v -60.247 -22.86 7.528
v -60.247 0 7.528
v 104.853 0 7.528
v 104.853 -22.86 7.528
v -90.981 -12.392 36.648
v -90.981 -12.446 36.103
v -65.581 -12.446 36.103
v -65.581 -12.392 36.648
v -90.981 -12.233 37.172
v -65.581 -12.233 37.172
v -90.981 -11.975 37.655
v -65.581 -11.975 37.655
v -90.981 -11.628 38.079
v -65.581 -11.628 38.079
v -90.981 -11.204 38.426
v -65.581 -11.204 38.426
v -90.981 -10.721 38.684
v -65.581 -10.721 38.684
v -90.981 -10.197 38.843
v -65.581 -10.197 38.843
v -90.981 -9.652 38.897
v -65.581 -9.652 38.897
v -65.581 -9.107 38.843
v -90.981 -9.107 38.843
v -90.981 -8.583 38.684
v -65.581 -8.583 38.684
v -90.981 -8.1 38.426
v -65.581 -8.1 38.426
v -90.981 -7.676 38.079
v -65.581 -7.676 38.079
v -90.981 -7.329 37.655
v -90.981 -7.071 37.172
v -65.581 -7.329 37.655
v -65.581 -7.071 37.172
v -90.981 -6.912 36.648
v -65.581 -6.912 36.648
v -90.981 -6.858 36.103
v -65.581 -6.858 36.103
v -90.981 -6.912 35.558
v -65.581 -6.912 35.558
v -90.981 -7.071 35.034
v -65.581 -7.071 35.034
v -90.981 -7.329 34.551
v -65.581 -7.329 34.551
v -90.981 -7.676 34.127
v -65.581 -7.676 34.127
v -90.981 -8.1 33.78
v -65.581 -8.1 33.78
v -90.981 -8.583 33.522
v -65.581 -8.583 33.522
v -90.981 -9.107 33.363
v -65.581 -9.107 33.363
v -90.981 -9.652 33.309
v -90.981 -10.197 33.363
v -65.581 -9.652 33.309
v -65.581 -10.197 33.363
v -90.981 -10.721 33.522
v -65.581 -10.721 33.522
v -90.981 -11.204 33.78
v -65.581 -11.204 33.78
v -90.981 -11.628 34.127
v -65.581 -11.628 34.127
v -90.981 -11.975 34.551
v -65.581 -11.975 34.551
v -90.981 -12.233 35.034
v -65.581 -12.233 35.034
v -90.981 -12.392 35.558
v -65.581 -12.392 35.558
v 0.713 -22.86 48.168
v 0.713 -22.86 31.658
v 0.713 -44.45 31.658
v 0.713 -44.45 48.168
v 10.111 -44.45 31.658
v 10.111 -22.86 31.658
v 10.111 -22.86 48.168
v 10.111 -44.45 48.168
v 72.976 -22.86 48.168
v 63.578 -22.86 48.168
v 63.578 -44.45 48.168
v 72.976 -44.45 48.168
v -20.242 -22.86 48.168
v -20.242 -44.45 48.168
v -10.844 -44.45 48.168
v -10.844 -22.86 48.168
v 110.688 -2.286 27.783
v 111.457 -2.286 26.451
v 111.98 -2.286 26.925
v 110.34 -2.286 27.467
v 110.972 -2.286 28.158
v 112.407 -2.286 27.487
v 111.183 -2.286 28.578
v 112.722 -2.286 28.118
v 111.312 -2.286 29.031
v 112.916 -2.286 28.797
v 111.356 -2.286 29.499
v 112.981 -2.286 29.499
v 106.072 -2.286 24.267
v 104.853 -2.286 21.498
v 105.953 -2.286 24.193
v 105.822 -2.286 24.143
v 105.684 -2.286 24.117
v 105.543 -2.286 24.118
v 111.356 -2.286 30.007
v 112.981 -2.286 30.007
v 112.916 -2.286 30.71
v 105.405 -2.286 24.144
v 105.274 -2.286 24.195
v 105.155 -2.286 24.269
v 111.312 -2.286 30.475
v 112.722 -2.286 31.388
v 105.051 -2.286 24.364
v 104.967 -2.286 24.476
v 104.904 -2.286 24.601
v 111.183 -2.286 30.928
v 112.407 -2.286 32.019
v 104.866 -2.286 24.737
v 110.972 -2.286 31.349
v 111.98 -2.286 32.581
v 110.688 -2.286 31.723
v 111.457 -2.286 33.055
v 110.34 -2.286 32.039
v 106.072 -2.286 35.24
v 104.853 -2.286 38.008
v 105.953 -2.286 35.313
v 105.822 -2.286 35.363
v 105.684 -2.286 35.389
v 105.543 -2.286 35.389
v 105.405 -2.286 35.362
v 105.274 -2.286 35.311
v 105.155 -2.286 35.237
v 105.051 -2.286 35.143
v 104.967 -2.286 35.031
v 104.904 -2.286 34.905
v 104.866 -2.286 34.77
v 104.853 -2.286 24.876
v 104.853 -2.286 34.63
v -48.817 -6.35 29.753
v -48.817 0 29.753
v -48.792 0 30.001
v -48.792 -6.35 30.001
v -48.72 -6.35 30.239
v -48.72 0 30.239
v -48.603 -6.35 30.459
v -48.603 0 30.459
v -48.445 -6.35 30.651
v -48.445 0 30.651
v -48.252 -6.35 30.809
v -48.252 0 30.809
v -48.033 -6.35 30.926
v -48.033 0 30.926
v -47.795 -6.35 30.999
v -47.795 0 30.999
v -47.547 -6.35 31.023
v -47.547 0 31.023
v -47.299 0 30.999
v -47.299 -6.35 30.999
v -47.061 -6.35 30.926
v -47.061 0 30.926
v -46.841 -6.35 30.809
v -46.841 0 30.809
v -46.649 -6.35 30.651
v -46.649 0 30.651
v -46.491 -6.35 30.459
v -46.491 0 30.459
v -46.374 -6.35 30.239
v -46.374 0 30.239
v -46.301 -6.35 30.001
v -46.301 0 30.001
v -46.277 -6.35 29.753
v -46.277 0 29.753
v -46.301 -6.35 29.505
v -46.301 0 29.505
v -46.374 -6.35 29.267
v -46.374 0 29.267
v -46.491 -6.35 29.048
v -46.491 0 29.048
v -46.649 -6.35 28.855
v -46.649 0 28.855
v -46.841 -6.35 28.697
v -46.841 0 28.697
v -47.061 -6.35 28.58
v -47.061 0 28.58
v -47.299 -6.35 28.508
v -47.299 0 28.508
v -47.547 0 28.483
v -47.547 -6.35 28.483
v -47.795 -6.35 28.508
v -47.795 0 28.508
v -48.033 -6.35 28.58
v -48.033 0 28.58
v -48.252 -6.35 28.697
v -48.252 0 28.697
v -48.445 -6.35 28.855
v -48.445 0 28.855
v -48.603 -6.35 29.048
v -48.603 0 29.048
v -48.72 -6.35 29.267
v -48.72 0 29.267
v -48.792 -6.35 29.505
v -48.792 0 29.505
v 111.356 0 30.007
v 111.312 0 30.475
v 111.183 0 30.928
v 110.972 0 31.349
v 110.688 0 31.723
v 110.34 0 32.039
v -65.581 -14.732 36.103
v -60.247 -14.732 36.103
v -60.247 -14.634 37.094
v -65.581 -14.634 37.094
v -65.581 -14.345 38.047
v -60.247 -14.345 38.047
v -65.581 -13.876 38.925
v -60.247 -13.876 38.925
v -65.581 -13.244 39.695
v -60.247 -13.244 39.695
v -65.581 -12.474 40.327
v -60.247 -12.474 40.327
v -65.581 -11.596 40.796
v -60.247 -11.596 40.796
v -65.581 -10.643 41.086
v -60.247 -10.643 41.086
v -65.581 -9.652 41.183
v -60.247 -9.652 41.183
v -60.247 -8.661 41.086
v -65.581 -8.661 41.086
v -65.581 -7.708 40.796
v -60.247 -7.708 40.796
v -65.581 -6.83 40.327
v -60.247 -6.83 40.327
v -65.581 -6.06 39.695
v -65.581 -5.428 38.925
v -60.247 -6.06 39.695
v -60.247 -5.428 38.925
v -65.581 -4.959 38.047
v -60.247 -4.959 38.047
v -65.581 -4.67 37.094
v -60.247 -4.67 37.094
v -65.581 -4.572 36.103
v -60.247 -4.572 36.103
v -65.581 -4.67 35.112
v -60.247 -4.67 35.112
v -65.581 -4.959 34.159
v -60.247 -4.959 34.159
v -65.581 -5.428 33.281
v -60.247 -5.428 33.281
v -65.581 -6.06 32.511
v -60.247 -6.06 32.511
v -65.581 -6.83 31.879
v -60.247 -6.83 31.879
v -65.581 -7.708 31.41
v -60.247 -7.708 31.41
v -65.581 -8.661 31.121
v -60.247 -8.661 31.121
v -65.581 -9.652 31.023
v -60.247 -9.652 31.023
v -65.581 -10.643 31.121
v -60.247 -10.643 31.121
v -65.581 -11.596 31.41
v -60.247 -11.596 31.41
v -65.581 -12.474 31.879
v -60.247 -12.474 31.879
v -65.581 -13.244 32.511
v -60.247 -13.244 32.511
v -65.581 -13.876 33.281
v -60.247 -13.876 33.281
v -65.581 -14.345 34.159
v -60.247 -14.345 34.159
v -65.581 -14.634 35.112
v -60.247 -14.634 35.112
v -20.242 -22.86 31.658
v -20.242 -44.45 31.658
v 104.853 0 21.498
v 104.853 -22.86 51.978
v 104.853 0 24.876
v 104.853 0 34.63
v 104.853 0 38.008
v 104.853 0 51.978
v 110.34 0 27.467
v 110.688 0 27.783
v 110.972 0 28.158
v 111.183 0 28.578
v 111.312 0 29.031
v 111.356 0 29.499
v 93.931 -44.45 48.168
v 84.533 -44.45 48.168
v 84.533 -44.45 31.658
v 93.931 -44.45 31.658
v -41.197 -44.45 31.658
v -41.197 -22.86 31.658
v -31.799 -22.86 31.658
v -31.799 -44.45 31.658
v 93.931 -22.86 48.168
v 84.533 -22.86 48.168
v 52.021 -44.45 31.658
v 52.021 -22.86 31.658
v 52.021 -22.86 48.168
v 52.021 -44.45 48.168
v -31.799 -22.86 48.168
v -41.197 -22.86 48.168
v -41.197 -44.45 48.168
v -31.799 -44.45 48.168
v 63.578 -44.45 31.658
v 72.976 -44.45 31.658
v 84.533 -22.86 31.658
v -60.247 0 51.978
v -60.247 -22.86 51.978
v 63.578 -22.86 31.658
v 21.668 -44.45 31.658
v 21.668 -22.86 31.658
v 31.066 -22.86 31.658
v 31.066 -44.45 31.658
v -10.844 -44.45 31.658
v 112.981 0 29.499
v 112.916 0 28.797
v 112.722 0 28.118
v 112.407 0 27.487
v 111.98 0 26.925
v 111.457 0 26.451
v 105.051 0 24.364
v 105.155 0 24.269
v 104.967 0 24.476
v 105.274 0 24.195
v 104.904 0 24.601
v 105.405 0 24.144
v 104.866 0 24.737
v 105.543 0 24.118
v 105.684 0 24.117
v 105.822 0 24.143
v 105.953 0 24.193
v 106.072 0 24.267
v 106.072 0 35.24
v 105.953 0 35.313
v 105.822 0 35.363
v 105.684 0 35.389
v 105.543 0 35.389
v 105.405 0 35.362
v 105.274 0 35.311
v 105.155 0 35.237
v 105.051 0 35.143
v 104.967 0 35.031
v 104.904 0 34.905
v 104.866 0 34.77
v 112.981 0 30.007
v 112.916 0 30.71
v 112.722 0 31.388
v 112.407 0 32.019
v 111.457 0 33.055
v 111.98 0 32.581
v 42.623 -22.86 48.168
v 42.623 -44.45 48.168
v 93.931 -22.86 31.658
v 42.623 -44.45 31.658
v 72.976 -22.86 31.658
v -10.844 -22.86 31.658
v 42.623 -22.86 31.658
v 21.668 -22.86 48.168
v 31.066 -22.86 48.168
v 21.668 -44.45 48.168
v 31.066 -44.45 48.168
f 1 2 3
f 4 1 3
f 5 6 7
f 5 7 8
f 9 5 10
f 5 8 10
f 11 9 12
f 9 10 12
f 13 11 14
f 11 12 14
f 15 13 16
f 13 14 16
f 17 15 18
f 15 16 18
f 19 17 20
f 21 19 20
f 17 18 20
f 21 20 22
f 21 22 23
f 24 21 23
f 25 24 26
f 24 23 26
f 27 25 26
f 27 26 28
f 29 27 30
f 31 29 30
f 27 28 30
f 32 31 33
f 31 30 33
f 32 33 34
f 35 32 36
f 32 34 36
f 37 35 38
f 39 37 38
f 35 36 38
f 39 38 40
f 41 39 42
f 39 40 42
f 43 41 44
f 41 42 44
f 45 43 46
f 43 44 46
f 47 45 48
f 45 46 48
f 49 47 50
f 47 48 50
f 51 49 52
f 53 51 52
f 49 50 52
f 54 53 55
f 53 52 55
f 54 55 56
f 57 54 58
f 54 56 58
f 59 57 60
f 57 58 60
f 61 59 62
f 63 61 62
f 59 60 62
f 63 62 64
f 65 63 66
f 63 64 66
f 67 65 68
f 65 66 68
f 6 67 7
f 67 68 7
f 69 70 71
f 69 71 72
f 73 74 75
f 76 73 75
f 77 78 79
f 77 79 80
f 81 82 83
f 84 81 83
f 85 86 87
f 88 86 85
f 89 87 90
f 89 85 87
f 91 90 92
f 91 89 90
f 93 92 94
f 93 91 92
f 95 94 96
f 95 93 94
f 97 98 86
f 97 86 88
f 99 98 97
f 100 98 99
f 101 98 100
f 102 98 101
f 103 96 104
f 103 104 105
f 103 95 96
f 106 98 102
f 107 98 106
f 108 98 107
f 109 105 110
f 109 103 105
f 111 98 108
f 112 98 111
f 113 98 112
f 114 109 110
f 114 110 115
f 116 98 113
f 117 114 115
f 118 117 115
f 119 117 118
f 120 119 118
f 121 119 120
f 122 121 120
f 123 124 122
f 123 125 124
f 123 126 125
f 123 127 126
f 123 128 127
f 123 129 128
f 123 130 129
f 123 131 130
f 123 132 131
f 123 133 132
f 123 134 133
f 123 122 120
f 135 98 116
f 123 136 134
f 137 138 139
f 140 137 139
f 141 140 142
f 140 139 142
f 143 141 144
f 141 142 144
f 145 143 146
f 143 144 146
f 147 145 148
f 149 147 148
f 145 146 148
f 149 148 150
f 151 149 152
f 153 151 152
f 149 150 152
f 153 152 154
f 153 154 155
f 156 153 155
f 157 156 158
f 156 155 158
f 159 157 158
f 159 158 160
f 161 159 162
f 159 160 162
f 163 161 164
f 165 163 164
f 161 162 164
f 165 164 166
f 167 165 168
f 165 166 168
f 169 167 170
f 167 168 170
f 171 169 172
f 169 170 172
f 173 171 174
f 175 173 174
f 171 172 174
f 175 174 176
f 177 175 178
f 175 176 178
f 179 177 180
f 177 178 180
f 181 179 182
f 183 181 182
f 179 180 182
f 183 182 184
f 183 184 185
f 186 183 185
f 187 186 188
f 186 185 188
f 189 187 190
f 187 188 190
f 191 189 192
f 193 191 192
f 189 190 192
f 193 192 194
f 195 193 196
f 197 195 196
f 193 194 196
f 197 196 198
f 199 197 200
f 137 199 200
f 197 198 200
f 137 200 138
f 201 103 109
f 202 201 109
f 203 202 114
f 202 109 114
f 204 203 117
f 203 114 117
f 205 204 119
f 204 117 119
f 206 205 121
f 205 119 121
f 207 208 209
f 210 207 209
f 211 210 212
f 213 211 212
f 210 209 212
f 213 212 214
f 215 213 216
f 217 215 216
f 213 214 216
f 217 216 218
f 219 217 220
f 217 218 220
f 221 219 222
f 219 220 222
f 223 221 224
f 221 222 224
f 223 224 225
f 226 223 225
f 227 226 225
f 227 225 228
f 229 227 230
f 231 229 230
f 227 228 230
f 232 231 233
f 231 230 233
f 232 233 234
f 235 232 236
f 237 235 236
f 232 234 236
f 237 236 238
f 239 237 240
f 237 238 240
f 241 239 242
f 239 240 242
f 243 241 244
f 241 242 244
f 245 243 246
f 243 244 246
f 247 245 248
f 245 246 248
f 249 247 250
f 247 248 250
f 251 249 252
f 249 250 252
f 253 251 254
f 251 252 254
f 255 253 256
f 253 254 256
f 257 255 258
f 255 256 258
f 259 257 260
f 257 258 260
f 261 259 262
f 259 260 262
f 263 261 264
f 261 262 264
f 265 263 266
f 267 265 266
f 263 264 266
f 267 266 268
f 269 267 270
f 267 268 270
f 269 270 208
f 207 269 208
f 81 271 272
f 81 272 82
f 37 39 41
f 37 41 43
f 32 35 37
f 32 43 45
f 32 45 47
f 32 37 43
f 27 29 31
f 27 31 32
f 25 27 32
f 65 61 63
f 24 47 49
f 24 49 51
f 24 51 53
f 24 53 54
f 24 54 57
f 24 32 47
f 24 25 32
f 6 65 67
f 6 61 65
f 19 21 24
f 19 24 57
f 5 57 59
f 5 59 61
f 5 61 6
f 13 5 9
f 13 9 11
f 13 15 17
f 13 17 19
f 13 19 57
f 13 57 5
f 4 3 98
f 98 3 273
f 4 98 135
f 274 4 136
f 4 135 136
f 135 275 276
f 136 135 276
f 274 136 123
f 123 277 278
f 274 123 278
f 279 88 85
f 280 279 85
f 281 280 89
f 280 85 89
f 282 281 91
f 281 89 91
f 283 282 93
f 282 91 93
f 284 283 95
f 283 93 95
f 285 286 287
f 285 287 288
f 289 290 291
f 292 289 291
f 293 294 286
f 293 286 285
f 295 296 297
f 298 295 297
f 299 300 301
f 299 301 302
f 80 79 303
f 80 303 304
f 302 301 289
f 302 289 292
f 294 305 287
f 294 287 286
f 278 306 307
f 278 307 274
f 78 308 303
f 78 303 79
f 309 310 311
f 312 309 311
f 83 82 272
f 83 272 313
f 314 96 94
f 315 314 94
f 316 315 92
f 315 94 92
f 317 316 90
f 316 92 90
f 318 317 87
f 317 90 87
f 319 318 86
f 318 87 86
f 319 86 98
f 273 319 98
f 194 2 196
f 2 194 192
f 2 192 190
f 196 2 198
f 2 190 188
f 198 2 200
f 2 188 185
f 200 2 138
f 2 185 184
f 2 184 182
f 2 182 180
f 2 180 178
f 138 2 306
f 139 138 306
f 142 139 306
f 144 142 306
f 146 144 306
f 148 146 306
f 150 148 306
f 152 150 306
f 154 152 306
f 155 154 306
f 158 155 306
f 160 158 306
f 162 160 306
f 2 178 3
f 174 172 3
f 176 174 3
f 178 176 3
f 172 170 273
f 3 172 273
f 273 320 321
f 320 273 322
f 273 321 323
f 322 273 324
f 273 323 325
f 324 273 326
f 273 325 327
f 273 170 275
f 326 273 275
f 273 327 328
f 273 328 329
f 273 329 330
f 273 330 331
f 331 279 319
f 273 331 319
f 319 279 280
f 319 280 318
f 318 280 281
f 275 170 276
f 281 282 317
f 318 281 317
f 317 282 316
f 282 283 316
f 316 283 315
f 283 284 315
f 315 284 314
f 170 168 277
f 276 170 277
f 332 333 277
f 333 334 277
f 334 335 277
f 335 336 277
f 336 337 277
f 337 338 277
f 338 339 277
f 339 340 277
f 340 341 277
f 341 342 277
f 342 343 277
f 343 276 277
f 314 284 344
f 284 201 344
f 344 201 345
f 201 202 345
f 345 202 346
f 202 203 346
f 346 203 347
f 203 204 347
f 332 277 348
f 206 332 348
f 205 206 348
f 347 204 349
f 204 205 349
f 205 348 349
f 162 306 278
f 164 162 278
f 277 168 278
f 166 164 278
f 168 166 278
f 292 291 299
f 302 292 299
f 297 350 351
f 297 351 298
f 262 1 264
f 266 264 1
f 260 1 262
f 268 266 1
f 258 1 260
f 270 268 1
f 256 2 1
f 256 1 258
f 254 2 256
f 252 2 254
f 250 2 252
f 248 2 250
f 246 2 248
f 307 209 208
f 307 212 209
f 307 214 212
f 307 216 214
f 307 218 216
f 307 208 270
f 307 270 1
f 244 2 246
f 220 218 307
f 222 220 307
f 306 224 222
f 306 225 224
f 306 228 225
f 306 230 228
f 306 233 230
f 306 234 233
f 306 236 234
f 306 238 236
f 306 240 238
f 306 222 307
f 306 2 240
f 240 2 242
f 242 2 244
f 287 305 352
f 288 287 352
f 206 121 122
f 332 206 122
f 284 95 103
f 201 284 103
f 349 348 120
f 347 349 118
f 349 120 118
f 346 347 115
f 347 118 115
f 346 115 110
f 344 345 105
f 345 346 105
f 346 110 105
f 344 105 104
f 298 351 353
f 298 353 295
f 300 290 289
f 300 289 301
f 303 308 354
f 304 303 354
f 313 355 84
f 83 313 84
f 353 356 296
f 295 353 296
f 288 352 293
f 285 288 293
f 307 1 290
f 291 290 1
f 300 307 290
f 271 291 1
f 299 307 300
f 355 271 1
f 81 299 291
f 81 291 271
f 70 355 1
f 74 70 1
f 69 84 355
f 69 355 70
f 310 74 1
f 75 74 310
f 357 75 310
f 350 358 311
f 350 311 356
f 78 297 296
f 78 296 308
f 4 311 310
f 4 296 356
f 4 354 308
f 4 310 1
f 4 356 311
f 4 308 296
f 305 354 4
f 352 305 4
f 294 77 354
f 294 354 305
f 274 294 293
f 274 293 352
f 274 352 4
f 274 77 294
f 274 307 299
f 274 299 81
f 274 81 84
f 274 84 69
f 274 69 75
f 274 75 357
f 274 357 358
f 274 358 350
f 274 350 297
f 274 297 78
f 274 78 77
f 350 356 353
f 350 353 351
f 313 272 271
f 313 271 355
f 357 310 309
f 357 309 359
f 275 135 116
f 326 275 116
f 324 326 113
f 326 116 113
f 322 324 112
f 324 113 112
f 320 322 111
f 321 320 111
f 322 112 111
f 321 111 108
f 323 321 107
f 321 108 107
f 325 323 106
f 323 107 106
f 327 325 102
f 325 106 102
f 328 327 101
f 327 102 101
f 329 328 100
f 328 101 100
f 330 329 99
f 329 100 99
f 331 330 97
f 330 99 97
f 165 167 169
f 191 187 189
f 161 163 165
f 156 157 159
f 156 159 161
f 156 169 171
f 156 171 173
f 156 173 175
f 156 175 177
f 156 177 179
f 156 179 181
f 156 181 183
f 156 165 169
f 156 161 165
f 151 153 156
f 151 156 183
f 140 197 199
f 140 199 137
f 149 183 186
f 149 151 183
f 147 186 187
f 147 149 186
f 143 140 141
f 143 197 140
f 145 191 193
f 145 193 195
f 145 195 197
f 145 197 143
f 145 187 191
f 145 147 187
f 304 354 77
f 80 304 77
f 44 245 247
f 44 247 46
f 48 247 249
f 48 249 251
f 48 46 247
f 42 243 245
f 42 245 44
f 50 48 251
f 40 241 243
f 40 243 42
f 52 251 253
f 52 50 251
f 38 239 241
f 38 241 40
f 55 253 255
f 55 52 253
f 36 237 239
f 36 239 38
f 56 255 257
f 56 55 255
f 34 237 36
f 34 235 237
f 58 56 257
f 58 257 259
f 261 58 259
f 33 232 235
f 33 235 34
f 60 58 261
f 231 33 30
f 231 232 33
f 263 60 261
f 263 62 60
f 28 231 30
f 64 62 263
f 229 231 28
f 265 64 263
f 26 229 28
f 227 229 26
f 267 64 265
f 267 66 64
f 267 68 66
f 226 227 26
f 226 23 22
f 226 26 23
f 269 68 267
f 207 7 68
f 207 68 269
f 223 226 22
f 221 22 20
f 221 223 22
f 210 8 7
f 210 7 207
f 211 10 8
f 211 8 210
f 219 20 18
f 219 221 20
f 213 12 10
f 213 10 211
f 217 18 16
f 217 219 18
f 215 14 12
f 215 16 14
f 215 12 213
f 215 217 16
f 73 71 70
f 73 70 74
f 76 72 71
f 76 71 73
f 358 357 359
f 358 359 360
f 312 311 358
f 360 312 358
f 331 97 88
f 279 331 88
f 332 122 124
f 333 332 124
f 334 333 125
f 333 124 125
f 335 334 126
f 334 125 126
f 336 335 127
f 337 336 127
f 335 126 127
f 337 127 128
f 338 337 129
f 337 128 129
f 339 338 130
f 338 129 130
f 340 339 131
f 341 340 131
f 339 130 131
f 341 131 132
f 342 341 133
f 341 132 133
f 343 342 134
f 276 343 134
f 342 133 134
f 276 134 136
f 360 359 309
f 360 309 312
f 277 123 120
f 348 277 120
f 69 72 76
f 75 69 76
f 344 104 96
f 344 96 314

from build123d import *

# Parameters (mm, degrees)
F0_W      = 165.1
F0_H      = 44.45
F1_DEPTH  = 22.86
F2_R      = 5.08
F3_DEPTH  = 5.334
F4_R      = 2.794
F5_DEPTH  = 25.4
F6_W      = 9.398
F6_H      = 16.51
F7_DEPTH  = 21.59
F8_W      = 2.286
F8_H      = 16.51
F9_DEPTH  = 8.128
F11_DEPTH = 25.4
F12_R     = 1.27
F13_DEPTH = 6.35


with BuildPart() as f1:
    # F0 (on Front) → F1 (new body)
    with BuildSketch(Plane.XZ):
        with Locations((22.303157, 29.753123)):
            Rectangle(F0_W, F0_H)
    extrude(amount=F1_DEPTH)

    # F2 (on face) → F3 (join)
    with BuildSketch(Plane(origin=(-60.246843, 0, 0), x_dir=(0, -1, 0), z_dir=(-1, 0, 0))):
        with Locations((9.652, 36.103123)):
            Circle(F2_R)
    extrude(amount=F3_DEPTH)

    # F4 (on face) → F5 (join)
    with BuildSketch(Plane(origin=(-65.580843, 0, 0), x_dir=(0, -1, 0), z_dir=(-1, 0, 0))):
        with Locations((9.652, 36.103123)):
            Circle(F4_R)
    extrude(amount=F5_DEPTH)

    # F6 (on face) → F7 (join)
    with BuildSketch(Plane.XZ.offset(22.86)):
        with Locations((-36.497843, 39.913123)):
            Rectangle(F6_W, F6_H)
        with Locations((-15.542843, 39.913123)):
            Rectangle(F6_W, F6_H)
        with Locations((5.412157, 39.913123)):
            Rectangle(F6_W, F6_H)
        with Locations((26.367157, 39.913123)):
            Rectangle(F6_W, F6_H)
        with Locations((47.322157, 39.913123)):
            Rectangle(F6_W, F6_H)
        with Locations((68.277157, 39.913123)):
            Rectangle(F6_W, F6_H)
        with Locations((89.232157, 39.913123)):
            Rectangle(F6_W, F6_H)
    extrude(amount=F7_DEPTH)

    # F8 (on face) → F9 (join)
    with BuildSketch(Plane.YZ.offset(104.853157)):
        with Locations((-1.143, 29.753123)):
            Rectangle(F8_W, F8_H)
    extrude(amount=F9_DEPTH)

    # F10 (on face) → F11 (cut)
    with BuildSketch(Plane.XZ.offset(2.286)):
        with BuildLine():
            Line((112.981157, 38.008123), (104.853157, 38.008123))
            Line((104.853157, 38.008123), (111.457157, 33.055123))
            ThreePointArc((111.457157, 33.055123), (112.578924, 31.711006), (112.981157, 30.007123))
            Line((112.981157, 30.007123), (112.981157, 31.912123))
            Line((112.981157, 31.912123), (112.981157, 38.008123))
        make_face()
        with BuildLine():
            Line((112.981157, 27.594123), (112.981157, 29.499123))
            ThreePointArc((112.981157, 29.499123), (112.578924, 27.795239), (111.457157, 26.451123))
            Line((111.457157, 26.451123), (104.853157, 21.498123))
            Line((104.853157, 21.498123), (112.981157, 21.498123))
            Line((112.981157, 21.498123), (112.981157, 27.594123))
        make_face()
        with BuildLine():
            Line((110.339557, 32.039123), (106.072357, 35.239523))
            ThreePointArc((106.072357, 35.239523), (105.27438, 35.311476), (104.853157, 34.629923))
            Line((104.853157, 34.629923), (104.853157, 29.753123))
            Line((104.853157, 29.753123), (111.355557, 29.753123))
            Line((111.355557, 29.753123), (111.355557, 30.007123))
            ThreePointArc((111.355557, 30.007123), (111.087402, 31.143045), (110.339557, 32.039123))
        make_face()
        with BuildLine():
            Line((111.355557, 29.753123), (104.853157, 29.753123))
            Line((104.853157, 29.753123), (104.853157, 24.876323))
            ThreePointArc((104.853157, 24.876323), (105.27438, 24.194769), (106.072357, 24.266723))
            Line((106.072357, 24.266723), (110.339557, 27.467123))
            ThreePointArc((110.339557, 27.467123), (111.087402, 28.3632), (111.355557, 29.499123))
            Line((111.355557, 29.499123), (111.355557, 29.753123))
        make_face()
    extrude(amount=-F11_DEPTH, mode=Mode.SUBTRACT)

    # F12 (on face) → F13 (cut)
    with BuildSketch(Plane(origin=(0, 0, 0), x_dir=(-1, 0, 0), z_dir=(0, 1, 0))):
        with Locations((47.546843, 29.753123)):
            Circle(F12_R)
    extrude(amount=-F13_DEPTH, mode=Mode.SUBTRACT)


solid = f1.part
